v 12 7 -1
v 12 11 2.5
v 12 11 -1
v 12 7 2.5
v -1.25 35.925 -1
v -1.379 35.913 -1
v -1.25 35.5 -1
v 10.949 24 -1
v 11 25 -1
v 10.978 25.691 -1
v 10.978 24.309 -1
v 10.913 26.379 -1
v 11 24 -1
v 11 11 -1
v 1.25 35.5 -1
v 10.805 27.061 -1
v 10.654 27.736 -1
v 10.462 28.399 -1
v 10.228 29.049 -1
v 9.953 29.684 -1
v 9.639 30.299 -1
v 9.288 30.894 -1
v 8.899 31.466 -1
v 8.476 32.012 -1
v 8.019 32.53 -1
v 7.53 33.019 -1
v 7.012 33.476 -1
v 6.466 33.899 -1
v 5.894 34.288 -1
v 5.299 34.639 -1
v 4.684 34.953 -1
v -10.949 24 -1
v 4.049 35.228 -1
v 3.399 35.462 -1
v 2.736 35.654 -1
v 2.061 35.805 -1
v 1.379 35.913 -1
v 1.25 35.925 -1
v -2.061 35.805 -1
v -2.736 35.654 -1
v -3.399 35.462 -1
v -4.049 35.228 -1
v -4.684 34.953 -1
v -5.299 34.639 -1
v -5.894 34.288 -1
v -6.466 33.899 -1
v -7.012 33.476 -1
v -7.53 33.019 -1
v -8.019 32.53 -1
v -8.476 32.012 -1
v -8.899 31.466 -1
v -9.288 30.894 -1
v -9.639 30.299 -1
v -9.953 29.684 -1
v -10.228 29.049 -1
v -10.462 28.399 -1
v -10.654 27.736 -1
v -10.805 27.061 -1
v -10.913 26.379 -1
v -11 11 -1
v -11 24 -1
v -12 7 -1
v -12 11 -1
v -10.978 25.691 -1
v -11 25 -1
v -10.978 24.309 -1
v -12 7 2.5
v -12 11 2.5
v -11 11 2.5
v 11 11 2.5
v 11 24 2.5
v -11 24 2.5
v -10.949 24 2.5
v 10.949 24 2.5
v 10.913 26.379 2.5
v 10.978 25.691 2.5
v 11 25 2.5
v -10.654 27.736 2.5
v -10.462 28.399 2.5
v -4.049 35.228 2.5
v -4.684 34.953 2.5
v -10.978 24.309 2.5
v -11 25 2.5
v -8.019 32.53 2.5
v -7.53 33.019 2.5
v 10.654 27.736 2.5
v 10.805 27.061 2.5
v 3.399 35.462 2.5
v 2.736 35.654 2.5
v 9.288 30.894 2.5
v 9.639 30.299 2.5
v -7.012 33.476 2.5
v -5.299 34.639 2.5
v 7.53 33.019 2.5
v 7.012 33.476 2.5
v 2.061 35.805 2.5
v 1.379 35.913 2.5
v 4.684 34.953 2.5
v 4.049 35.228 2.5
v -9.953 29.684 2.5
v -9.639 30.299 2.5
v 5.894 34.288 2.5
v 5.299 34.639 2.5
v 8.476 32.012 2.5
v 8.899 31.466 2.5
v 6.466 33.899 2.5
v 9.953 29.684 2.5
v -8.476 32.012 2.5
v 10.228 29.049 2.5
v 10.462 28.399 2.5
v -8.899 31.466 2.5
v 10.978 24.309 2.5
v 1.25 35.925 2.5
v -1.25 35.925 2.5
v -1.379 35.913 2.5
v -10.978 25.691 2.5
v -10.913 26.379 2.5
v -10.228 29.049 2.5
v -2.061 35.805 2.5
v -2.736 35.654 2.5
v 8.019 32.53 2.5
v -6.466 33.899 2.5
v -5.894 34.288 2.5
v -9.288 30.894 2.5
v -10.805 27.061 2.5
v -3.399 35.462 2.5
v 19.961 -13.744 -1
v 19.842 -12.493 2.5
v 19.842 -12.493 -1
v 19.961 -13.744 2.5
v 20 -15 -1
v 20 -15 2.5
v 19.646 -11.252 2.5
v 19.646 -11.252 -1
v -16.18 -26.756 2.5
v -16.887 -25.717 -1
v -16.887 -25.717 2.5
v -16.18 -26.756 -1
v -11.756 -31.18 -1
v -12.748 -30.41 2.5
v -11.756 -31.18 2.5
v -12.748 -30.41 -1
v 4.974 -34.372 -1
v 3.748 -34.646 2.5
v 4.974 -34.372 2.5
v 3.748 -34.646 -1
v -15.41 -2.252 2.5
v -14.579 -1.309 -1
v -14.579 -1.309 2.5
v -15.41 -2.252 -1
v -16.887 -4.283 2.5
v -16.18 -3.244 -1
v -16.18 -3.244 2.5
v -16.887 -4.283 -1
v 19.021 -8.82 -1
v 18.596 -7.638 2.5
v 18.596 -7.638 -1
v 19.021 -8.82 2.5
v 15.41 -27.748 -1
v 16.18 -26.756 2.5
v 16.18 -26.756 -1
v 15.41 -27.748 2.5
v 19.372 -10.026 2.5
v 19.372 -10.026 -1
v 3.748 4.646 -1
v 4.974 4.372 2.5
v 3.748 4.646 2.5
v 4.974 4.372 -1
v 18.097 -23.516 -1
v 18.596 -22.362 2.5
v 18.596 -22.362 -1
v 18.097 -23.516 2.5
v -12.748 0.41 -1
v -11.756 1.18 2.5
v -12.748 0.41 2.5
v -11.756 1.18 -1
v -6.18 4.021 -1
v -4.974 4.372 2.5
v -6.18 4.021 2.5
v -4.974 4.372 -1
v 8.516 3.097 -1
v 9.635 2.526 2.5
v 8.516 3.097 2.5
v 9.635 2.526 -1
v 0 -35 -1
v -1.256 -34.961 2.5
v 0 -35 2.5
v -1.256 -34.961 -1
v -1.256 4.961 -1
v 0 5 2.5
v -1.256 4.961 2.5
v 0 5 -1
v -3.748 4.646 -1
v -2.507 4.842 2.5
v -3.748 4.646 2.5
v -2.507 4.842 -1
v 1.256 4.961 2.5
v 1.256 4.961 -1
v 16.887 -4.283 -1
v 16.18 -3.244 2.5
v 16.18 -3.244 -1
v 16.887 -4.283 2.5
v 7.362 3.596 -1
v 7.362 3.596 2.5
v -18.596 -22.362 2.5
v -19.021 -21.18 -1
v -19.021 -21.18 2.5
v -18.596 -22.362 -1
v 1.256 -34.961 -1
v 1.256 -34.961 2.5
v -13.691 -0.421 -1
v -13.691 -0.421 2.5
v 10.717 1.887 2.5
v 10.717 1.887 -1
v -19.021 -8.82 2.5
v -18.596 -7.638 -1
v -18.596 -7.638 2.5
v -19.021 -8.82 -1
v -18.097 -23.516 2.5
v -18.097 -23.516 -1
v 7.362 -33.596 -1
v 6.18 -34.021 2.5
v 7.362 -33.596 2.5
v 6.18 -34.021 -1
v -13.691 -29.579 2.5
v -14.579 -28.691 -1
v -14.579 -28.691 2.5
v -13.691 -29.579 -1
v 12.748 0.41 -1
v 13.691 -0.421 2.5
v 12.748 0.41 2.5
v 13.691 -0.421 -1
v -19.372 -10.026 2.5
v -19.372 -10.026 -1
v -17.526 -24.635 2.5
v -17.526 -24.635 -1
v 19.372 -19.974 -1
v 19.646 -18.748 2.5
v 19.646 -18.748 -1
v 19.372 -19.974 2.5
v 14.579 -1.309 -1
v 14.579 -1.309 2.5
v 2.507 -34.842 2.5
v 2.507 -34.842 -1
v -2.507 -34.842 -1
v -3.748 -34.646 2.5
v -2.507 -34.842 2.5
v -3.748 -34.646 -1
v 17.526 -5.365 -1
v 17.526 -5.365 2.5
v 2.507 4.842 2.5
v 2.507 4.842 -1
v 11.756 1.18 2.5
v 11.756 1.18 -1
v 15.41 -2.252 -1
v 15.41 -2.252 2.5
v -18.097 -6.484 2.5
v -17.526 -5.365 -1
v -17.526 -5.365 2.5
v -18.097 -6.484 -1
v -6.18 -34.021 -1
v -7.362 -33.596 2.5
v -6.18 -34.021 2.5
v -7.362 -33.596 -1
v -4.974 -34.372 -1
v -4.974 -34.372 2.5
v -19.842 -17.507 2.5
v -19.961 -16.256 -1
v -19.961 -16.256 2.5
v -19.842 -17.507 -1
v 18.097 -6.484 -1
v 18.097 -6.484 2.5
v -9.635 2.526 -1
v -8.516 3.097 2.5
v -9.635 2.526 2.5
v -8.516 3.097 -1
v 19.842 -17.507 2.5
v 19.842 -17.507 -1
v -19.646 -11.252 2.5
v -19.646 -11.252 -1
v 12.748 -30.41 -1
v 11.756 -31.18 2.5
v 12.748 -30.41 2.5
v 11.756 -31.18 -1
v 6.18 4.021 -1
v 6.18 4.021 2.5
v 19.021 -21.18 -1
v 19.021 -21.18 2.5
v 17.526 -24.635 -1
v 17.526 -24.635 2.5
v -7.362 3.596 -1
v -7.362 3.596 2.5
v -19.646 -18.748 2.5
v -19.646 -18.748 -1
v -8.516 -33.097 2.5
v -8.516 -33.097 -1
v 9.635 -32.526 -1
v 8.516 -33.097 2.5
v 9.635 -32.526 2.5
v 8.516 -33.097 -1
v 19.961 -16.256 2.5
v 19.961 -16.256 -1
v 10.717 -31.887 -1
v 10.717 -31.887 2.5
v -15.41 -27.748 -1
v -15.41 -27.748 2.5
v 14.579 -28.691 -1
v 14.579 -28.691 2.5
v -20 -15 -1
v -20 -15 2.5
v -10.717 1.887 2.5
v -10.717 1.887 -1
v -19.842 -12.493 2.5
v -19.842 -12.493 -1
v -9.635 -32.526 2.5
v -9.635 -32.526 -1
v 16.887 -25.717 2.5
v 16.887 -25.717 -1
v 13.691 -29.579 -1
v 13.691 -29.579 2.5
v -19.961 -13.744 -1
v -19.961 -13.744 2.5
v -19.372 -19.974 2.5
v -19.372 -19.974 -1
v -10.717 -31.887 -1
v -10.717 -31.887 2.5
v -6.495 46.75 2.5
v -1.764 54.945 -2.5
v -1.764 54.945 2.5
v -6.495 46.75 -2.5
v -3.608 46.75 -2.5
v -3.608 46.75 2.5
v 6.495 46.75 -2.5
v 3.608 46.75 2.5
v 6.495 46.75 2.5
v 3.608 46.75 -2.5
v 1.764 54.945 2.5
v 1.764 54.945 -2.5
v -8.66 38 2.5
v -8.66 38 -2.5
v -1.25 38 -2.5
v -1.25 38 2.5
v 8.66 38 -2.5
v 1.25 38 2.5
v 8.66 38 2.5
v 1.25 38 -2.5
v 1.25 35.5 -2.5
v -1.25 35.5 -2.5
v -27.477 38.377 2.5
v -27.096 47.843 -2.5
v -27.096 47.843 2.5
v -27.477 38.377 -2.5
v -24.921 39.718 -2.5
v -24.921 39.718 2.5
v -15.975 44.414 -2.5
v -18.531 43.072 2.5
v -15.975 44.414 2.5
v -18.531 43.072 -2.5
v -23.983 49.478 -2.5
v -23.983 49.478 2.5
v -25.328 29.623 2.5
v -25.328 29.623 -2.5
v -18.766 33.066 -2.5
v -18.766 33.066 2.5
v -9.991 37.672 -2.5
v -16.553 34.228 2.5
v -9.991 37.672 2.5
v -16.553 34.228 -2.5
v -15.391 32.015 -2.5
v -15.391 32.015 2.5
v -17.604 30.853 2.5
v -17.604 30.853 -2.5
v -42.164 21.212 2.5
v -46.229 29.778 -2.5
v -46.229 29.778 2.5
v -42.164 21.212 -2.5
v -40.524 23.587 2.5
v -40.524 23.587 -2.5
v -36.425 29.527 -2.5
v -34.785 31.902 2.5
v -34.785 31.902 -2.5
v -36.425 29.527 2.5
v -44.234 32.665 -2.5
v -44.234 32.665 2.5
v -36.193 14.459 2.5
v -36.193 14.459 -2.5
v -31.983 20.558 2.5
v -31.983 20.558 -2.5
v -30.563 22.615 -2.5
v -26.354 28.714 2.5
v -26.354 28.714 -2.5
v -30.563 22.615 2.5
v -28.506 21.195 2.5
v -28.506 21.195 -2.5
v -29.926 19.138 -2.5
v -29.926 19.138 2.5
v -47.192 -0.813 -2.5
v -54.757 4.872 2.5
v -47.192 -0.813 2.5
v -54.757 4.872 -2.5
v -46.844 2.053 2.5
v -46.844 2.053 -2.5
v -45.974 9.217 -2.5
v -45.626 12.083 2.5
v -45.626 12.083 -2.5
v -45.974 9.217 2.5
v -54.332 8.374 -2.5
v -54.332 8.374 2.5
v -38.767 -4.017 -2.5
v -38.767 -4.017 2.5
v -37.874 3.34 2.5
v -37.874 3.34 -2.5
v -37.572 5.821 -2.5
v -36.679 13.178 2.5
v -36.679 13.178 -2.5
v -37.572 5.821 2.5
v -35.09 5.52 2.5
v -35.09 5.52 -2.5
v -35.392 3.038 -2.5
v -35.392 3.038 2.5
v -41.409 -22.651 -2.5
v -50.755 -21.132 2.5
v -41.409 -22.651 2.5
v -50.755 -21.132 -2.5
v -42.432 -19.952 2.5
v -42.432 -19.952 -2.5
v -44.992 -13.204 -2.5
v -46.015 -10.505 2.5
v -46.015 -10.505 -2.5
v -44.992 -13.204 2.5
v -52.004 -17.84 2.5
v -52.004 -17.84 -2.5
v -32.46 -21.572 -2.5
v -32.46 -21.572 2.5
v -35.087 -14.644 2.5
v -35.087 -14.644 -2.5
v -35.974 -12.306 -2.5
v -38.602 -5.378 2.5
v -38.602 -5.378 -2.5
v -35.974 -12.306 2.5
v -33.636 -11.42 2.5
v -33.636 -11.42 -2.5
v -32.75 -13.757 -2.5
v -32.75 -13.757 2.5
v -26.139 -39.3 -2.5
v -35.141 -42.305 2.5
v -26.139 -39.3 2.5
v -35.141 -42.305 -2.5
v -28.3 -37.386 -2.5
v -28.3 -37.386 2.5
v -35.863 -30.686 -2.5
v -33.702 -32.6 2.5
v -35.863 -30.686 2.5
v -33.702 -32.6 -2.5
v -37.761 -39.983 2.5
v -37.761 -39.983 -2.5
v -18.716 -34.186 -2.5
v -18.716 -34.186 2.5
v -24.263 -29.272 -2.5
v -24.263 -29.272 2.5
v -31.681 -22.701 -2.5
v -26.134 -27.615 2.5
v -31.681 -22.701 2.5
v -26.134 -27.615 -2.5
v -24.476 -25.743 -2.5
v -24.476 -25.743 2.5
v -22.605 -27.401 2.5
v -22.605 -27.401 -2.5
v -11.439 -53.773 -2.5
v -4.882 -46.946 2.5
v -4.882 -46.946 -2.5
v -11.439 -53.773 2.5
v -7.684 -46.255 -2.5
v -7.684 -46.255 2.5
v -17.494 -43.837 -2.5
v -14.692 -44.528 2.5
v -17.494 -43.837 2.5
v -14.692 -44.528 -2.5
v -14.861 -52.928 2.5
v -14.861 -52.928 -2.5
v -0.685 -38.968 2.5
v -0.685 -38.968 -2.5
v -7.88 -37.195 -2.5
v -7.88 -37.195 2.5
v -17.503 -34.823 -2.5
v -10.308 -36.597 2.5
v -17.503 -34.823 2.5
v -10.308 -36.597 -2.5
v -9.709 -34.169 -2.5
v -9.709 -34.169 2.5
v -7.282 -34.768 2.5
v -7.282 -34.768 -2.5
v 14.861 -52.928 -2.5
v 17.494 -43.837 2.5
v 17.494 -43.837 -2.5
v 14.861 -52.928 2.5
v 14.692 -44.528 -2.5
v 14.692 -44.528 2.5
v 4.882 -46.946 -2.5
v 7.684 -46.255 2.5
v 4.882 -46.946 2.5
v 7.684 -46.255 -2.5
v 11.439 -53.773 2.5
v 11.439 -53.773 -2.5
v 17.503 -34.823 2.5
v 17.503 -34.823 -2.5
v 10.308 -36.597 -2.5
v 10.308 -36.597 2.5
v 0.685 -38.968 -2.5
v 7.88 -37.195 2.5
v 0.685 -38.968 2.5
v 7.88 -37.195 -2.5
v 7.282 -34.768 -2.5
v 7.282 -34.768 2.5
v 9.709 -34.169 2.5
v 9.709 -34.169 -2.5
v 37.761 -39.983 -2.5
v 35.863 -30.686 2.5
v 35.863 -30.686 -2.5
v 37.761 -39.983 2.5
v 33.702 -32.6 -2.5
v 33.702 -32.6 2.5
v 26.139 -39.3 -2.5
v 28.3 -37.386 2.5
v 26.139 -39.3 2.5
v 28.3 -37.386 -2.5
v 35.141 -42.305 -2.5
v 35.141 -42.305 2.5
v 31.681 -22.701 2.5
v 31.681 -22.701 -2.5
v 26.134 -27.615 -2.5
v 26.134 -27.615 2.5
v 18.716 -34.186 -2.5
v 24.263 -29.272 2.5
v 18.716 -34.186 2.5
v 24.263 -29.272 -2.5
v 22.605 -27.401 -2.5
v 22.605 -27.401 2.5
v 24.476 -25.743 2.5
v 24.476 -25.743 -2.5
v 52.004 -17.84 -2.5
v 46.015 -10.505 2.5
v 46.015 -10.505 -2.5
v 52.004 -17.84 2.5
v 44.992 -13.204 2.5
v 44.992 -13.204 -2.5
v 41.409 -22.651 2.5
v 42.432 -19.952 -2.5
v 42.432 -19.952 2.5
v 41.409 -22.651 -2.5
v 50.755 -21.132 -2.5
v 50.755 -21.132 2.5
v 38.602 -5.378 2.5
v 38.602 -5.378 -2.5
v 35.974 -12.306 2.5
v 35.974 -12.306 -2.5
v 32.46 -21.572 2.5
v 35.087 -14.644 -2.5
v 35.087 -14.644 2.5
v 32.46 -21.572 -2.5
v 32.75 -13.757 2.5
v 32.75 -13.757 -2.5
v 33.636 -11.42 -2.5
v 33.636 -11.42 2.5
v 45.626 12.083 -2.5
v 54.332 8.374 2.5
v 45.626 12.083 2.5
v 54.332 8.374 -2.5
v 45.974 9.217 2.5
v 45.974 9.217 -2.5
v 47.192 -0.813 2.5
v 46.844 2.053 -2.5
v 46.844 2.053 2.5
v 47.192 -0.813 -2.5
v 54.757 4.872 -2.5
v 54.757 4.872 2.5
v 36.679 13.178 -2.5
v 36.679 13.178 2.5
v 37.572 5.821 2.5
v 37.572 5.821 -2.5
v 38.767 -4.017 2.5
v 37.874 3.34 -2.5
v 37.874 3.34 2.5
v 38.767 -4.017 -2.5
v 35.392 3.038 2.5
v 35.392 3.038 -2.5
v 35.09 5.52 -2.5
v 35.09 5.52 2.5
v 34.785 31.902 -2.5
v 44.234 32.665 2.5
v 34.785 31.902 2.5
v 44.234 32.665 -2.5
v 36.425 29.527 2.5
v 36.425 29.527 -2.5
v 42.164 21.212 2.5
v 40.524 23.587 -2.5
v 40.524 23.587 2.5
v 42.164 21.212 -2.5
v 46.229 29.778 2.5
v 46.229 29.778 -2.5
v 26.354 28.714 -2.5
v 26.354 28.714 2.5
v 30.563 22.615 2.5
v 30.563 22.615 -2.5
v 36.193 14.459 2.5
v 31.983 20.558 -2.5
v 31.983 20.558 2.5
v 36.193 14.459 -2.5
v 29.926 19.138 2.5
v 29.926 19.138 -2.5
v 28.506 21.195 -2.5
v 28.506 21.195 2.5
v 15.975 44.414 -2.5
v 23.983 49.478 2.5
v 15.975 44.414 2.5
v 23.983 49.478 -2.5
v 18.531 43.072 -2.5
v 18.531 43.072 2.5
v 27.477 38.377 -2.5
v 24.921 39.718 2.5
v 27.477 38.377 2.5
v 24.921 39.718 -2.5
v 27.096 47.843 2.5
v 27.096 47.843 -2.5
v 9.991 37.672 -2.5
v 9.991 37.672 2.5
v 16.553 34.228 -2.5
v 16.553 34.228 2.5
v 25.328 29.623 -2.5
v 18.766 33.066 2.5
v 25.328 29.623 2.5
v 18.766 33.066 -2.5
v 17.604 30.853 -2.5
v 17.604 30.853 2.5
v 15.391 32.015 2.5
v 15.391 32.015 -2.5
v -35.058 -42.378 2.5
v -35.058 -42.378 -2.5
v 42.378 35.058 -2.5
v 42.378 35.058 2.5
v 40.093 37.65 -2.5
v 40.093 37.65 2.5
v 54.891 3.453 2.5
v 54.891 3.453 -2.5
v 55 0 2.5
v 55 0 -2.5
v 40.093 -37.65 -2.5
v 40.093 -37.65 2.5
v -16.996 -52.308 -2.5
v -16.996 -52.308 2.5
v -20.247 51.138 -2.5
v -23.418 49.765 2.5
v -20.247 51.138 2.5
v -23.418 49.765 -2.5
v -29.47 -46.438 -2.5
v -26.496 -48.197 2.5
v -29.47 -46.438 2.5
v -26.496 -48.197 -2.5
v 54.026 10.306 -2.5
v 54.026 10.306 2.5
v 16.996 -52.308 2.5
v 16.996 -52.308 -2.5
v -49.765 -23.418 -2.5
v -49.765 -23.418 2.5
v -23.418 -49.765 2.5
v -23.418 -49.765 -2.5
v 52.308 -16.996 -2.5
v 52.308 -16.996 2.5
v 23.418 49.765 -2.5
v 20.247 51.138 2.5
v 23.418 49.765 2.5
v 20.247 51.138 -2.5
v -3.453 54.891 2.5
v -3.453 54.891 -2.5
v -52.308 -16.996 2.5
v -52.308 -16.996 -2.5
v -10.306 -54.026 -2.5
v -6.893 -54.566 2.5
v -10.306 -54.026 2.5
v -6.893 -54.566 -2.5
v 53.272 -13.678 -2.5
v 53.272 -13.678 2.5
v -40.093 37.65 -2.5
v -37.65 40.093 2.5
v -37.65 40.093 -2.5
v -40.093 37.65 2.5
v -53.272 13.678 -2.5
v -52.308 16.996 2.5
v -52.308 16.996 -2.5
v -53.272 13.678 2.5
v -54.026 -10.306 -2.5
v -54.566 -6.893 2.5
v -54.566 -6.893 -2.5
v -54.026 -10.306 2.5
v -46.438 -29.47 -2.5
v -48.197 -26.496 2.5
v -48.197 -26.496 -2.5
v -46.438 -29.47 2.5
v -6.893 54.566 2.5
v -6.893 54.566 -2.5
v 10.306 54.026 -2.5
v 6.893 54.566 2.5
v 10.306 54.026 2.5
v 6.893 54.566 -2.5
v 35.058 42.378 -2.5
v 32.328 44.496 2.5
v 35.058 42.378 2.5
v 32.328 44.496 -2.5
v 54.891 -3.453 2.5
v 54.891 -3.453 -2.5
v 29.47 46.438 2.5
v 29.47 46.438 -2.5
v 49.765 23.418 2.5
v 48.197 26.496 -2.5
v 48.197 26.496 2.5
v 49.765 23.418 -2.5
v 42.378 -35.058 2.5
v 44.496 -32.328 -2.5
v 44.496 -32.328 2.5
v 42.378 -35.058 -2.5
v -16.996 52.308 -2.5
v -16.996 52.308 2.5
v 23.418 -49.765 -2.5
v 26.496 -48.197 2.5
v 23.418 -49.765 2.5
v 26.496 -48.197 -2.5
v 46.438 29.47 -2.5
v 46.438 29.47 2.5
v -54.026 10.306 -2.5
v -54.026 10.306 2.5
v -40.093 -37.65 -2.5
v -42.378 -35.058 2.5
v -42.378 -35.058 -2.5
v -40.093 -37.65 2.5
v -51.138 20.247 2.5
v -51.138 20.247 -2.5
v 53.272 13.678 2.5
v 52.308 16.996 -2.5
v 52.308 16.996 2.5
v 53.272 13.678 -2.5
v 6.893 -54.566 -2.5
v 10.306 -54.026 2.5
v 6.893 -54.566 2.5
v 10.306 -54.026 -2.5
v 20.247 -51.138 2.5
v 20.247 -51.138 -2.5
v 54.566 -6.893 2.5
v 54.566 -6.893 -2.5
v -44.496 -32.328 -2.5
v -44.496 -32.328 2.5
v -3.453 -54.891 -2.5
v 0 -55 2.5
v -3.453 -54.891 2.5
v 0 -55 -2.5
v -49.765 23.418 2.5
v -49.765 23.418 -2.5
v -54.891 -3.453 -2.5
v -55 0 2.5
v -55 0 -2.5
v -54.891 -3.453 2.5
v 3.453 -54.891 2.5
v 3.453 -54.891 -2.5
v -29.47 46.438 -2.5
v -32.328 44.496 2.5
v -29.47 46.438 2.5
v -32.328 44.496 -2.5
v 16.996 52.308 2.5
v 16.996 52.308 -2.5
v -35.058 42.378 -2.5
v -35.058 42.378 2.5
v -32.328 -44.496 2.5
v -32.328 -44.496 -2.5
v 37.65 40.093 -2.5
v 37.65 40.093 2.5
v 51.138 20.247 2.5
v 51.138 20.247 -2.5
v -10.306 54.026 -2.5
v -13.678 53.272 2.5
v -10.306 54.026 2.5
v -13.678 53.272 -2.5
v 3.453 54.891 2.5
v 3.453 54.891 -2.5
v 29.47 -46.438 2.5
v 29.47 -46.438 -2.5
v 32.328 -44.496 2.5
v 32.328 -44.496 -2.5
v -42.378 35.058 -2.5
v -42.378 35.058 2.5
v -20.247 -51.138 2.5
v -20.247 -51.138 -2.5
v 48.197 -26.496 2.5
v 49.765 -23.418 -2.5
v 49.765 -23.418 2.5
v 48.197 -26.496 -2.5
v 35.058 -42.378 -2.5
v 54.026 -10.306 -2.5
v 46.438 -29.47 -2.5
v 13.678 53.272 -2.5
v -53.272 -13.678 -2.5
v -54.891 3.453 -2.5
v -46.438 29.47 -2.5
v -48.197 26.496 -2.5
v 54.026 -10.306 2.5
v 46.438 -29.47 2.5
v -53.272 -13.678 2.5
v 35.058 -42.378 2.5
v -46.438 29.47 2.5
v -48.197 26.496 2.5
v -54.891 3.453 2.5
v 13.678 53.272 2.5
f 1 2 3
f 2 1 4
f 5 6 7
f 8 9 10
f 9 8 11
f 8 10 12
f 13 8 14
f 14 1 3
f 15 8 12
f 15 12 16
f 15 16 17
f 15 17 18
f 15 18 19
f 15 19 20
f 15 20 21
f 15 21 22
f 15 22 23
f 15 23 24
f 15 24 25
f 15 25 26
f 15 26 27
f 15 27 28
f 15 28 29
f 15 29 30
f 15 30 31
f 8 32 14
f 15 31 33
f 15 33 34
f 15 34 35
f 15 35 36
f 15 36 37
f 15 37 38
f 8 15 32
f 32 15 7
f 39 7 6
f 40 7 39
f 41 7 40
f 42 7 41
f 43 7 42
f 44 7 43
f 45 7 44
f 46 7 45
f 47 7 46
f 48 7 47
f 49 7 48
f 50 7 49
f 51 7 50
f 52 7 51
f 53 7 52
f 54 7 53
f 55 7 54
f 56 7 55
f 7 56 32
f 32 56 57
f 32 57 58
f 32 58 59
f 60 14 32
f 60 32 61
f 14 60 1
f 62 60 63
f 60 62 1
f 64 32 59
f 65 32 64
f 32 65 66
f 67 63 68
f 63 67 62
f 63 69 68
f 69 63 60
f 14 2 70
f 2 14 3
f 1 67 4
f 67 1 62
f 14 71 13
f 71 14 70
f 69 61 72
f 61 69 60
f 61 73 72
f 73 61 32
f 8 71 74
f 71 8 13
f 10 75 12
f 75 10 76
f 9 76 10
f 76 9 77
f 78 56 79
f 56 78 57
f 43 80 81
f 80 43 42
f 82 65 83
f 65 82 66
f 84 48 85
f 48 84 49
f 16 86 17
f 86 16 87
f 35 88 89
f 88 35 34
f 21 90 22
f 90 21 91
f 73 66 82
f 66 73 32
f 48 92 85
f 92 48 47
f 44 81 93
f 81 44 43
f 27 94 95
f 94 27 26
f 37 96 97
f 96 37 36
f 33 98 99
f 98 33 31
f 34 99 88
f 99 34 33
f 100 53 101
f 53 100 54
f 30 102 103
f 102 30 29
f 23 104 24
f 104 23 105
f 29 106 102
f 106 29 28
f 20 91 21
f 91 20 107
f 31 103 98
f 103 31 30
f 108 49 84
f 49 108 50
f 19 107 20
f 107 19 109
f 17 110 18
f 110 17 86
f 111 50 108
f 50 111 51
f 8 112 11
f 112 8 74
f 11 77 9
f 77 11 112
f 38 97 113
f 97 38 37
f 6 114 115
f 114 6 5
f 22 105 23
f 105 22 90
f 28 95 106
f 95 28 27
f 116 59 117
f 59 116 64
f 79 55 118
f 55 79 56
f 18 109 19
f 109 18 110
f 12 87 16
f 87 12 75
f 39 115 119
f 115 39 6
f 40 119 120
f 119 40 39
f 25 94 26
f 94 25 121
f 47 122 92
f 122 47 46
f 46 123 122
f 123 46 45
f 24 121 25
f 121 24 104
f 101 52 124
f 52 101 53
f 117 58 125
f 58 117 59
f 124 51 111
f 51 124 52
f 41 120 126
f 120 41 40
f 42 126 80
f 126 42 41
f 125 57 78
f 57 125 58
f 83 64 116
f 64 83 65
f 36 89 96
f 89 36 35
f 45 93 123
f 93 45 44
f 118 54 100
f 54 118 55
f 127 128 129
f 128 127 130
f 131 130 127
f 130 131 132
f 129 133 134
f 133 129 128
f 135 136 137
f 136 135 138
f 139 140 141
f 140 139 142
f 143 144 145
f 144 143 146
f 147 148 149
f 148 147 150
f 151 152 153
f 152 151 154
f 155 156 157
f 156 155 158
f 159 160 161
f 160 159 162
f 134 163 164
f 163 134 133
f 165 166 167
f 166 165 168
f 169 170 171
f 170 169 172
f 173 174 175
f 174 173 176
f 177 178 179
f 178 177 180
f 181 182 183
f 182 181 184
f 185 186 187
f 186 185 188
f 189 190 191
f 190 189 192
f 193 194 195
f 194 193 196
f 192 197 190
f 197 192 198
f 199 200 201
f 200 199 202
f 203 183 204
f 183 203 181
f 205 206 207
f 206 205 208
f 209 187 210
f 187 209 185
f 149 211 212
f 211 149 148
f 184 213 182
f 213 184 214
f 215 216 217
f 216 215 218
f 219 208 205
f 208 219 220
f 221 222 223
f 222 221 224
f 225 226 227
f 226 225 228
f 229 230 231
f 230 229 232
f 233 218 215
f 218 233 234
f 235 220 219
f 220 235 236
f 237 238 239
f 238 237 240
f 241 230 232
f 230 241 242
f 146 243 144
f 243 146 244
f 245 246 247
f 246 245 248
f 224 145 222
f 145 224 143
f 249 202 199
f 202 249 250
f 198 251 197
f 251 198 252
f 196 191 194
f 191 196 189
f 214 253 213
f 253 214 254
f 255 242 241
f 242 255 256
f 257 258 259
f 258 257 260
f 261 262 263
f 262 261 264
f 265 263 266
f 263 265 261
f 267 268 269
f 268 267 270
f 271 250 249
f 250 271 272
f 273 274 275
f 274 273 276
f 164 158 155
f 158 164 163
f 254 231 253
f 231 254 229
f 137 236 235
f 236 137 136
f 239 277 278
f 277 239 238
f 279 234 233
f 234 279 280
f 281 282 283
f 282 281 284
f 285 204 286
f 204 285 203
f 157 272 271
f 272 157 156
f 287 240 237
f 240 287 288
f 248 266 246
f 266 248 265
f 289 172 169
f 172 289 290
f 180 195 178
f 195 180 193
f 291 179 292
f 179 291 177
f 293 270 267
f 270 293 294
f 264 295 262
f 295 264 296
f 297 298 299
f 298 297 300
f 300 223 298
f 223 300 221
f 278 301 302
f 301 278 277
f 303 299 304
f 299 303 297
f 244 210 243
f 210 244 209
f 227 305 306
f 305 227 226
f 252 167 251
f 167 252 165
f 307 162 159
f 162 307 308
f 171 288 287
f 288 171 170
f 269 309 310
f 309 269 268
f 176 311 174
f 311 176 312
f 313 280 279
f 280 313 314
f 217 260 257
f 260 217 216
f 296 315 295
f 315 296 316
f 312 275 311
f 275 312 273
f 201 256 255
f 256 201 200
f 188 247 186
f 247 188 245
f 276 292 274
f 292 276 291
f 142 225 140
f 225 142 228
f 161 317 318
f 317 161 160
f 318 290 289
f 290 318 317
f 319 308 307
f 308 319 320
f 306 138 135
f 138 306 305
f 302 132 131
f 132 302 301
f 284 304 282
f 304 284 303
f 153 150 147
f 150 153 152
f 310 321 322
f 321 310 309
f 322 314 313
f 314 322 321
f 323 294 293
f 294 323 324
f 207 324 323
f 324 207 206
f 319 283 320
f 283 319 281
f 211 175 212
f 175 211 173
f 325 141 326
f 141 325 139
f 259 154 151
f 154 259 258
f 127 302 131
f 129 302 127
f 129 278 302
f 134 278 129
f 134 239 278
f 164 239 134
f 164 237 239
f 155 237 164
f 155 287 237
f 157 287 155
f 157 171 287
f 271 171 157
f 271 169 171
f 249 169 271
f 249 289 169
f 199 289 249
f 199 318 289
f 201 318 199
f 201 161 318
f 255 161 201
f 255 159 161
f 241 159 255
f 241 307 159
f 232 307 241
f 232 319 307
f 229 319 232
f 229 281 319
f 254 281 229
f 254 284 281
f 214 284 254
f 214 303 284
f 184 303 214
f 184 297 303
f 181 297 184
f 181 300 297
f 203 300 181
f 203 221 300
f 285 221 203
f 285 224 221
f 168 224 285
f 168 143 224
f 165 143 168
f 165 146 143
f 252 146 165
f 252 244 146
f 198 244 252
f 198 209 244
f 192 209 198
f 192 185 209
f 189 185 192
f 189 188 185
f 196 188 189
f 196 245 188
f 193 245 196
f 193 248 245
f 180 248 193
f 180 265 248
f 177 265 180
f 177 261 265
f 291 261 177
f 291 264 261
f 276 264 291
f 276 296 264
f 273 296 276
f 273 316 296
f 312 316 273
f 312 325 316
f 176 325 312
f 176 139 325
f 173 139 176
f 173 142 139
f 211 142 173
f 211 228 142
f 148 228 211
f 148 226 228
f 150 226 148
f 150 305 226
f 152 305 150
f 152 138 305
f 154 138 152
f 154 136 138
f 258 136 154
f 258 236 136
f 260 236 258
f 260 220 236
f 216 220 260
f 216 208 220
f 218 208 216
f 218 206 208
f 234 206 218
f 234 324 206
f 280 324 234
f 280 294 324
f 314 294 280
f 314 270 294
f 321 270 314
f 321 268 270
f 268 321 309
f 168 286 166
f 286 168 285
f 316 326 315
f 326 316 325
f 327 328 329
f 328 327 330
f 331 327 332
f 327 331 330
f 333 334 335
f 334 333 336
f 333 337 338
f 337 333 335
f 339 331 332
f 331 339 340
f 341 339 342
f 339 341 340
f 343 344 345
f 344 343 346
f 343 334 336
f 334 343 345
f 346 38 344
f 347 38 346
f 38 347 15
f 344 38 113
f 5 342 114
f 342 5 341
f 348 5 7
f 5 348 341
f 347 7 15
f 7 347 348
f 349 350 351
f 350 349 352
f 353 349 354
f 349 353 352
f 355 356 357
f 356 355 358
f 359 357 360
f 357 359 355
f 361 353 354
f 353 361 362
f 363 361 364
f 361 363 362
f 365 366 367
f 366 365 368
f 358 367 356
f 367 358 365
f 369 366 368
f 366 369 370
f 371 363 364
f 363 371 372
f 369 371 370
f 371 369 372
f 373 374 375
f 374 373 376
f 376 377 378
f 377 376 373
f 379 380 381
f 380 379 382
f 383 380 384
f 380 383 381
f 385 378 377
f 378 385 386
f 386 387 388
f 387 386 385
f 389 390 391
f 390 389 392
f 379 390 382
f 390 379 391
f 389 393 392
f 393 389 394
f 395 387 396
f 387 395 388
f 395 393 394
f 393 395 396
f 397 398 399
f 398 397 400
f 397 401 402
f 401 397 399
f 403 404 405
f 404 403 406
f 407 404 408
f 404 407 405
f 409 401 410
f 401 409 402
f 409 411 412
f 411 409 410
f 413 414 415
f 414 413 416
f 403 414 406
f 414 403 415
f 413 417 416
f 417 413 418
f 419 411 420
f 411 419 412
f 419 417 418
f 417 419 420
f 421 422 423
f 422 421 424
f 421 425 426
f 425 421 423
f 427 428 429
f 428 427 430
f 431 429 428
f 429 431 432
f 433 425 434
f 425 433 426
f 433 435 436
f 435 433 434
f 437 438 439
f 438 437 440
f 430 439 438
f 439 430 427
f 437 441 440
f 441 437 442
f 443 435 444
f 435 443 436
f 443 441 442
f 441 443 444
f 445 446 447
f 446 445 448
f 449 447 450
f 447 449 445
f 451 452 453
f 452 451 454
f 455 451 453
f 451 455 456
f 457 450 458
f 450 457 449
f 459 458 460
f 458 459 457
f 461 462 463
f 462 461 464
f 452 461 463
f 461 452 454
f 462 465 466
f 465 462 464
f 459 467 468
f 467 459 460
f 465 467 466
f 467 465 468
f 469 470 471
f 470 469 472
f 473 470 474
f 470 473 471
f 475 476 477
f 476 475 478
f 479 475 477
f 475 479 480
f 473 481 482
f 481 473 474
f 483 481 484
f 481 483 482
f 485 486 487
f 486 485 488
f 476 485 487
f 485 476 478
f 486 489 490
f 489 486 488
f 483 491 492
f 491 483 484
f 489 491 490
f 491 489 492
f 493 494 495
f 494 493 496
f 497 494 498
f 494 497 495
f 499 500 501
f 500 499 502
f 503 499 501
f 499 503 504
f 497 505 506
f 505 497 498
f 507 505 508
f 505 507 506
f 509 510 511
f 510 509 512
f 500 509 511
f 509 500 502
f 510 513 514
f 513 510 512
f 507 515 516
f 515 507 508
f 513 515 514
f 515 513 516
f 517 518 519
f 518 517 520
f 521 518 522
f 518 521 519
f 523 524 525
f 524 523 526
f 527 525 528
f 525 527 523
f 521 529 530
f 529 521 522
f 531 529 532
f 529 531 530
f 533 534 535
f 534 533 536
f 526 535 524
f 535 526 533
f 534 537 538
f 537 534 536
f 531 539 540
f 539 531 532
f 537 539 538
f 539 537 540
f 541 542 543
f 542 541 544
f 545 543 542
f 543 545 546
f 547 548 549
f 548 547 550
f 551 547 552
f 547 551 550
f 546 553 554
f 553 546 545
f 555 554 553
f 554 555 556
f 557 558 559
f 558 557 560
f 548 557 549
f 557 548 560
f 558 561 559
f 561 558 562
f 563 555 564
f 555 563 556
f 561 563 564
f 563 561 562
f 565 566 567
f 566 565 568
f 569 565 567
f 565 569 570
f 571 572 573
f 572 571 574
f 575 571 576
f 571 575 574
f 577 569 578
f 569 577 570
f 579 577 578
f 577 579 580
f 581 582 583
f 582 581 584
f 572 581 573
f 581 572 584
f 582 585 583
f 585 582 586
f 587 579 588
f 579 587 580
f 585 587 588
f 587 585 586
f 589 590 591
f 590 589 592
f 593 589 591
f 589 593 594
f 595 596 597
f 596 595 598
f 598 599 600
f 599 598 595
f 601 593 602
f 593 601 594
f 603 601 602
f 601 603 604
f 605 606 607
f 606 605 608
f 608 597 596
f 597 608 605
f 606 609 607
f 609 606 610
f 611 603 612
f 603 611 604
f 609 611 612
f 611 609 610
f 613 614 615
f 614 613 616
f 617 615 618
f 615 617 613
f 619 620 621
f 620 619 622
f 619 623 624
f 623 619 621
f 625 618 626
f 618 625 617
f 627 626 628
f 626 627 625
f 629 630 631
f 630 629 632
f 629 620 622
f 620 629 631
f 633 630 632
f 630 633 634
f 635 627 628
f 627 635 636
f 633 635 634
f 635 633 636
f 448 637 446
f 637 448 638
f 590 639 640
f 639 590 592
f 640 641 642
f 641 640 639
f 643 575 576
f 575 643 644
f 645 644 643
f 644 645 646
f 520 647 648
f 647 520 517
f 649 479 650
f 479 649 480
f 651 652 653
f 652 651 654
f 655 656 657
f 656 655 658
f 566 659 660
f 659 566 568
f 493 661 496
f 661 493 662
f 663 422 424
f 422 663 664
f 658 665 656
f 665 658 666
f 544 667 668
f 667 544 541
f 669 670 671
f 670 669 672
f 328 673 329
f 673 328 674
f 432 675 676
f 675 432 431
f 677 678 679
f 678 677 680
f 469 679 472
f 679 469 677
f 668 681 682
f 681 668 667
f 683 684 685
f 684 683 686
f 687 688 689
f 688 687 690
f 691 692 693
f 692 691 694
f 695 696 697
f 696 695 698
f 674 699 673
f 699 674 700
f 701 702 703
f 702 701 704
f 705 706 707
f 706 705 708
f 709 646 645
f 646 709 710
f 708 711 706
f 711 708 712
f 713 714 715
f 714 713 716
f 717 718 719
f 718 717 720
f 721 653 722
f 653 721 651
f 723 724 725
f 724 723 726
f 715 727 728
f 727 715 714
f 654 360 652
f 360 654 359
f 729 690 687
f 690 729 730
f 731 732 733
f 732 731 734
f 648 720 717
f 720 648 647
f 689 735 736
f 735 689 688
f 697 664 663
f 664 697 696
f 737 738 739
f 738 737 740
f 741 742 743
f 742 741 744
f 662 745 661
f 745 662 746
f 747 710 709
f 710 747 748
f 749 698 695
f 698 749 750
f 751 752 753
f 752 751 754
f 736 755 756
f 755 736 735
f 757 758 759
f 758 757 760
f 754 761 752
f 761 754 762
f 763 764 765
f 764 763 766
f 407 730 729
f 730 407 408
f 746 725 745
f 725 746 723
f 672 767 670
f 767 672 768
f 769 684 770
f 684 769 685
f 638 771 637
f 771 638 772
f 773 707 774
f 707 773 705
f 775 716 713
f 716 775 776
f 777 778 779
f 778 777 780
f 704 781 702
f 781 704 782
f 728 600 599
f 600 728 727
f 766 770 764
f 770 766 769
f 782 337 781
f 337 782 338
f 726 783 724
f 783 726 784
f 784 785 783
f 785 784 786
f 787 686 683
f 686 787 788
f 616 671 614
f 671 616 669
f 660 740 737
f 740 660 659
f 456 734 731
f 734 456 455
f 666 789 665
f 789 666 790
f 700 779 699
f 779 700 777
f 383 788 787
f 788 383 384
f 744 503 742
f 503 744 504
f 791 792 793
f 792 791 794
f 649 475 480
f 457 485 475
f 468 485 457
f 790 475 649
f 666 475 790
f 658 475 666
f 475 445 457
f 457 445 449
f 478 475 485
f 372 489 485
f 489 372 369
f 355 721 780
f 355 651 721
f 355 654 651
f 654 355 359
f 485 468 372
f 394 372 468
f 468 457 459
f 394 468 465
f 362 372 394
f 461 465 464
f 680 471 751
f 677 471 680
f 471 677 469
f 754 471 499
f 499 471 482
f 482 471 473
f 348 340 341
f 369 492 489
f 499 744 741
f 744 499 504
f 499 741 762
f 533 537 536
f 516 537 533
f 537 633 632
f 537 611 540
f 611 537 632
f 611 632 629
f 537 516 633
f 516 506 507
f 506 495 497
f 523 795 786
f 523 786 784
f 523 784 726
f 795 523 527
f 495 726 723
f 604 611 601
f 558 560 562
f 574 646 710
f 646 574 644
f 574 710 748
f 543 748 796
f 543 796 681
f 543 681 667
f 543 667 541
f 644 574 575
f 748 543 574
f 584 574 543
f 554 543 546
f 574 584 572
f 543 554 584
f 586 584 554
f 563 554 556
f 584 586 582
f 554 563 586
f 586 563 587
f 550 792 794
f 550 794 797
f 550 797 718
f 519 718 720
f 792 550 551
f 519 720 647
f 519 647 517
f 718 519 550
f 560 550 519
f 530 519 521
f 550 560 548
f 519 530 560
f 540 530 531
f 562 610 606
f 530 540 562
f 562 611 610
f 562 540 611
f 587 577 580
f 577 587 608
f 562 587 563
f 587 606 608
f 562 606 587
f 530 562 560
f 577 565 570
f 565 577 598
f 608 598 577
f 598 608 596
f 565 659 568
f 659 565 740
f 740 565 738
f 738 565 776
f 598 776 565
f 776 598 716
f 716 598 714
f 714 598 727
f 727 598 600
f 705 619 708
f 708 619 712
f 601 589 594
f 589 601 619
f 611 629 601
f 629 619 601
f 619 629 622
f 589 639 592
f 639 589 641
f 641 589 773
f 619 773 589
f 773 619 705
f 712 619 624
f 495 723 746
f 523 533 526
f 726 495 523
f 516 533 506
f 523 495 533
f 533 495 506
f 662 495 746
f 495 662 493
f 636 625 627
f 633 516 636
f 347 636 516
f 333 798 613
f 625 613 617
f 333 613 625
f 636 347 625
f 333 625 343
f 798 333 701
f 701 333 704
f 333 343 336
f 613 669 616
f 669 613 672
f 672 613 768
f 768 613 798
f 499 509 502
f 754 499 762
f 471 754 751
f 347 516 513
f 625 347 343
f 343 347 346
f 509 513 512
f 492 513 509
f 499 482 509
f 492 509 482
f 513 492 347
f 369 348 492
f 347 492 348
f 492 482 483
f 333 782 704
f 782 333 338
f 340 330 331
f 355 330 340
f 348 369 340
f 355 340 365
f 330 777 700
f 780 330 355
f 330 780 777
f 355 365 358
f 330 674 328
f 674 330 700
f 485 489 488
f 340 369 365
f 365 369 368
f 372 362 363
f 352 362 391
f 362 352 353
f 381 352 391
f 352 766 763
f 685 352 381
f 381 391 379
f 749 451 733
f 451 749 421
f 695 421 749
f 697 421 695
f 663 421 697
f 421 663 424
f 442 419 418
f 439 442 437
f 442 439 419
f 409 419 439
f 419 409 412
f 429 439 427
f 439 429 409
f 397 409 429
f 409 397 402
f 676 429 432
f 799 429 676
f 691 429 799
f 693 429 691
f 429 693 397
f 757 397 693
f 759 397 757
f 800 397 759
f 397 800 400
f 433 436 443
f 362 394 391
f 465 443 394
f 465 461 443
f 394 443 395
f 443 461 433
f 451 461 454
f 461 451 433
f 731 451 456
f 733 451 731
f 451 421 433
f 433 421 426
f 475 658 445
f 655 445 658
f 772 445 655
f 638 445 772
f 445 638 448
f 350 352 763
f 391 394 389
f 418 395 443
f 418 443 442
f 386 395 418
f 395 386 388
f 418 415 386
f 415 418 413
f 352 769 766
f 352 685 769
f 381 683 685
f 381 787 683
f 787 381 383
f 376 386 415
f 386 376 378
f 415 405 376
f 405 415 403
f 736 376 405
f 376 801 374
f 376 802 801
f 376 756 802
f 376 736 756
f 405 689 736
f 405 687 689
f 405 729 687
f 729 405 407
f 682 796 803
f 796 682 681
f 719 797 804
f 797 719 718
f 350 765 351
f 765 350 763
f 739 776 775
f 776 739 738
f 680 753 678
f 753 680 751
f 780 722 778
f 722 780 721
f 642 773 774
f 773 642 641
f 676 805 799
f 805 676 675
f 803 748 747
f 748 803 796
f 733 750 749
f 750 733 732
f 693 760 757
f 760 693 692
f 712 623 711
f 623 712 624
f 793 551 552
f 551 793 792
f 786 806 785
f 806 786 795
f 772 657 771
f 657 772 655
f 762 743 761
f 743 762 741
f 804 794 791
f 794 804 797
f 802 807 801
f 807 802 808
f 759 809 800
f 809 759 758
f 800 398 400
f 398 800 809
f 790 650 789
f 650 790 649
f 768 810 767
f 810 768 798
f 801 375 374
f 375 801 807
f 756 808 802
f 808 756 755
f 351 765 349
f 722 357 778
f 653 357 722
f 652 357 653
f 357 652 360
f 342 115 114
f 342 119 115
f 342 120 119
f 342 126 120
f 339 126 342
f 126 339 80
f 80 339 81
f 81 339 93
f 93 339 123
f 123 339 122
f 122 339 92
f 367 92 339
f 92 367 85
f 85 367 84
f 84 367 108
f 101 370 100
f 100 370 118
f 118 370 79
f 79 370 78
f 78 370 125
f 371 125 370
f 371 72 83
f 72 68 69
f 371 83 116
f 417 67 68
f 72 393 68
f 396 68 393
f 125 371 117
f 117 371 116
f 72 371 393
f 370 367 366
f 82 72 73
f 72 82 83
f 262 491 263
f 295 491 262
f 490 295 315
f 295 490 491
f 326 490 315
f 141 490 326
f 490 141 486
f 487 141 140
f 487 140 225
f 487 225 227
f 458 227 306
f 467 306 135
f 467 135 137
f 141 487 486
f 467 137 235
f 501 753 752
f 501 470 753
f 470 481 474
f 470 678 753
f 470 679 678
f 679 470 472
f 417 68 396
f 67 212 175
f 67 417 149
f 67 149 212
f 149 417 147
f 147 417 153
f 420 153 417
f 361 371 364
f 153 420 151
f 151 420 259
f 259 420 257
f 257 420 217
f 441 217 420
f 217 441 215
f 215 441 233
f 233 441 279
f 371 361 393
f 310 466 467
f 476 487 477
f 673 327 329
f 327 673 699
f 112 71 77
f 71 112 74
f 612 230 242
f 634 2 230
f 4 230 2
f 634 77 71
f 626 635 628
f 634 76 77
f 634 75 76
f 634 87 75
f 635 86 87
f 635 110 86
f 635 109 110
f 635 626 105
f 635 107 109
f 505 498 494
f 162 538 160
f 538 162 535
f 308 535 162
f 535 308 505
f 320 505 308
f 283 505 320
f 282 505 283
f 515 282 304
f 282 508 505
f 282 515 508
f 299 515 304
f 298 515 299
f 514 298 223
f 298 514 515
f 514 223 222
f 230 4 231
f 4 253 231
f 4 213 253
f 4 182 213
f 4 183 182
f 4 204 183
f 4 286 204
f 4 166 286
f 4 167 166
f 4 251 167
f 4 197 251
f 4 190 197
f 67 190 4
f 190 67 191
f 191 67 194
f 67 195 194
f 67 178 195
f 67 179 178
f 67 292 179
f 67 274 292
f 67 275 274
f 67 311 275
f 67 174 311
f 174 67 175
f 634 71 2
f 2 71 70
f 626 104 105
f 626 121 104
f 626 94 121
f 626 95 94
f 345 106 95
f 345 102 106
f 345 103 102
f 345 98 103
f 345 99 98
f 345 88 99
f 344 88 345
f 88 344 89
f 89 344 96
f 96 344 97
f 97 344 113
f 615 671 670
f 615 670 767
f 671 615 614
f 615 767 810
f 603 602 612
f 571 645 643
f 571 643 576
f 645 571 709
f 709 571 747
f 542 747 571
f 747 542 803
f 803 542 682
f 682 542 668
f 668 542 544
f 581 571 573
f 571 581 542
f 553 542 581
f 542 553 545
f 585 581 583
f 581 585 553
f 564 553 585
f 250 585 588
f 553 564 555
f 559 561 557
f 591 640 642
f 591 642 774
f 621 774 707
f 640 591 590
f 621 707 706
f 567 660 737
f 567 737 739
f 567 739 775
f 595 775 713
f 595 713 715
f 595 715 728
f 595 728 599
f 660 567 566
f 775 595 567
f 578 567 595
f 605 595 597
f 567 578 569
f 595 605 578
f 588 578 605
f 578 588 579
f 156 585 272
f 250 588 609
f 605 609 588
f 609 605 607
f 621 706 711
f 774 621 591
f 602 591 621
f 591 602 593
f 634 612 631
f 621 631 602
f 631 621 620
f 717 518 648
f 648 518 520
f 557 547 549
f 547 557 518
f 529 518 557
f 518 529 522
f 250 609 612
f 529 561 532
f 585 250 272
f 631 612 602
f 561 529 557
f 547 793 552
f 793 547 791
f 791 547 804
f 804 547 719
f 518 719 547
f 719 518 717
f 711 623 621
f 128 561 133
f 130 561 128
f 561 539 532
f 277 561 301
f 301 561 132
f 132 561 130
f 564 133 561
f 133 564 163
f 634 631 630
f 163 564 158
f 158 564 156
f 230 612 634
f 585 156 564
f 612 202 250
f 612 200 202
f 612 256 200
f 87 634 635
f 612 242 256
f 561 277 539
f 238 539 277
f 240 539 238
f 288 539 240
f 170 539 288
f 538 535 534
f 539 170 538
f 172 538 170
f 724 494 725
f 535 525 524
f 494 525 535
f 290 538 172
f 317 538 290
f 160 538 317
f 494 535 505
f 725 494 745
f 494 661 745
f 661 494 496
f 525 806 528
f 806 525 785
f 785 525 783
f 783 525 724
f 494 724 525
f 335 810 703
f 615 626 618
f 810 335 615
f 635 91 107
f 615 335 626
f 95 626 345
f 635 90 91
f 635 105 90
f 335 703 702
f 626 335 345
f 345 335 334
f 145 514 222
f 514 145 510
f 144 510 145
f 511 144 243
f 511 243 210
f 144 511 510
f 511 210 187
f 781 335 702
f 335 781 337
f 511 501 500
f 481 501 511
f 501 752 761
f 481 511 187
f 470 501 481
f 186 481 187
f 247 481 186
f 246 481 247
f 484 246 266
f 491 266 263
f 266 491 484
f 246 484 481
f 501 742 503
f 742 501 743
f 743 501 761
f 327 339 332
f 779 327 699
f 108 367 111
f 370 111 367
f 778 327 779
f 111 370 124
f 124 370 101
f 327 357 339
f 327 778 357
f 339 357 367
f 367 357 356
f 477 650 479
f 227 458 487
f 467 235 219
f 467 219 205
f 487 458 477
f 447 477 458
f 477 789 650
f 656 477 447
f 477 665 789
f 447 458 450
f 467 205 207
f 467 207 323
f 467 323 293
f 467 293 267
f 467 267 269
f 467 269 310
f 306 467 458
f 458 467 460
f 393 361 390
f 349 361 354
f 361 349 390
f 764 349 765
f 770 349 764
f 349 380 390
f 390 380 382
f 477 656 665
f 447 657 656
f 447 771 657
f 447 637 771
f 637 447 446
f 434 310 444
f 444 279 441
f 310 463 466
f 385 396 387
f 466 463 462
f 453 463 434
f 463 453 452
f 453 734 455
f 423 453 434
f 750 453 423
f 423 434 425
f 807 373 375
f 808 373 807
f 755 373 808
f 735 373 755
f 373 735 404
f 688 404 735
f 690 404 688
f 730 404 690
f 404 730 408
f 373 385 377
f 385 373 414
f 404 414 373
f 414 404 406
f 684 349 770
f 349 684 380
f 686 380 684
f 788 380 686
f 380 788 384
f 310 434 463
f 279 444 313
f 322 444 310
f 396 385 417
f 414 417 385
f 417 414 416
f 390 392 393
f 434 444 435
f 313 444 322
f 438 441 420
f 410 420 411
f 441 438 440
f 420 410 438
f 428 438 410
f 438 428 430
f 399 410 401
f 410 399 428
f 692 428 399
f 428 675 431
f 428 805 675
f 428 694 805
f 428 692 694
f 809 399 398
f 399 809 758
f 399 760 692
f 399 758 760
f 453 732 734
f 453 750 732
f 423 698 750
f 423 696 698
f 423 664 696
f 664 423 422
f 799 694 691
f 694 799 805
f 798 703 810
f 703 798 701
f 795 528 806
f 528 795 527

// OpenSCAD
// file: ../../../../shapes/religion/christianity/crucifixion-cross/crucifixion-cross.scad
crucifixionCcross();

module crucifixionCcross(height=2)
{
    beamWidth = 3;
    
    union()
    {
        // vertical beam
        xTranslate = -beamWidth / 2.0;
        yLength = 13;
        color("brown")
        translate([xTranslate, 0, 0])
        cube([3, yLength, height]);

        // horizontal beam        
        yTranslate = yLength * 0.5;
        xLength = yLength * 0.75;
        xTranslateHBeam = -xLength / 2.0;
        
        color("green")
        translate([xTranslateHBeam, yTranslate, 0])
        cube([xLength, 3, height]);        
    }        
}
// file: ../../../../shapes/trees/christmas/christmas-tree.scad
christmasTree();

module christmasTree(height = 3)
{
    union()
    {
        // top triangle
        translate([0, 30, 0])
        triangle(10, height);
        
        // middle triangle
        translate([0, 15, 0])
        color("green")
        triangle(15, height);
        
        // bottom triangle
        triangle(20, height);
        
        // trunk
        color("brown")
        translate([-2.5, -15, 0])
        cube([5, 5, height]);
    }
}

module triangle(size, height)
{
    rotate([0, 0, 90])
    cylinder(r=size, 
             $fn=3,
             h=height);
}
// file: ../../../../shapes/throwie-cutout/throwie-cutout.scad
throwieCutout();

/**
 * this modeled after a 5mm LED
 */
module throwieCutout(height=2)
{
    ledWidth = 10;
    ledHeight = 13;
    
    union()
    {
        // LED bottom cutout
        ledBottomCutoutLengthX = ledWidth + 1 + 1; 
        xTranslate = -ledBottomCutoutLengthX / 2.0;
        yLength = 13;
        color("brown")
        translate([xTranslate, 0, 0])
        cube([ledBottomCutoutLengthX, 2, height]);

        // LED middle coutout        
        yTranslate = 1.5;
        xLength = ledWidth + 1;
        xTranslateHBeam = -xLength / 2.0; 
        color("green")
        translate([xTranslateHBeam, yTranslate, 0])
        cube([xLength, 7, height]);
        
        // LED curved top
        curvedTopTranslateY = (2 + 7);
        curvedTopRadius = (ledWidth / 2.0) + 0.5;
        color("red")
        translate([0, curvedTopTranslateY, 0])
        cylinder (h = height, r=curvedTopRadius, $fn=100);
        
        // battery
        batteryRadius = 10;
        translate([0, -11, 0])
        cylinder (h = height, r=batteryRadius, $fn=100);
    }        
}
// file: ../../../../shapes/spurs/spurs-a.scad
// Module names are of the form poly_<inkscape-path-id>().  As a result,
// you can associate a polygon in this OpenSCAD program with the corresponding
// SVG element in the Inkscape document by looking for the XML element with
// the attribute id="inkscape-path-id".

// fudge value is used to ensure that subtracted solids are a tad taller
// in the z dimension than the polygon being subtracted from.  This helps
// keep the resulting .stl file manifold.
fudge = 0.1;

module spurs(h)
{
  scale([25.4/90, -25.4/90, 1]) union()
  {
    linear_extrude(height=h)
      polygon([[13.500000,-56.000000],[29.500000,-55.000000],[54.500000,-55.000000],[58.503750,-55.048750],[60.522969,-55.341719],[62.290000,-56.020000],[64.325156,-57.853594],[66.241250,-60.541250],[69.240000,-66.000000],[80.500000,-87.000000],[106.280000,-135.000000],[118.870000,-159.000000],[122.780000,-198.000000],[124.023594,-204.882813],[125.843750,-209.652500],[128.457031,-214.095937],[132.080000,-220.000000],[148.490000,-248.000000],[153.376719,-256.487656],[155.041895,-259.143652],[156.518750,-260.956250],[158.055137,-262.086816],[159.898906,-262.696719],[165.500000,-263.000000],[214.500000,-263.000000],[214.500000,-213.000000],[213.360000,-196.000000],[213.360000,-154.000000],[213.495000,-150.462500],[213.360000,-147.000000],[196.920000,-117.000000],[156.350000,-45.000000],[125.920000,9.000000],[120.671250,18.592500],[117.385469,23.577187],[115.794199,25.366055],[114.320000,26.400000],[112.797344,26.797500],[110.981250,26.970000],[107.500000,27.000000],[79.500000,27.000000],[65.500000,28.000000],[31.500000,28.000000],[27.943750,28.030000],[24.500000,28.600000],[22.684180,29.597539],[20.548438,31.277812],[15.792500,35.922500],[7.670000,45.000000],[-36.500000,94.040000],[-25.500000,94.040000],[-15.500000,95.000000],[1.500000,95.000000],[22.500000,96.000000],[2.500000,114.080000],[-38.500000,149.000000],[-23.230000,165.000000],[-3.230000,188.000000],[14.500000,210.000000],[-66.500000,189.000000],[-91.500000,263.000000],[-92.970664,261.624141],[-94.426562,259.592500],[-97.197500,254.302500],[-101.500000,244.000000],[-121.500000,198.000000],[-200.500000,222.000000],[-174.840000,182.000000],[-154.500000,151.000000],[-187.500000,128.020000],[-214.500000,108.000000],[-166.500000,103.830000],[-135.500000,101.000000],[-137.410000,77.000000],[-139.590000,41.000000],[-140.500000,31.000000],[-138.108496,32.343340],[-135.722969,34.055469],[-131.038750,38.223750],[-122.500000,47.000000],[-111.500000,57.040000],[-94.500000,74.000000],[-77.500000,27.000000],[-107.500000,26.000000],[-117.196250,25.451250],[-122.812656,24.814531],[-126.090000,23.980000],[-127.513906,22.488438],[-128.773750,20.335000],[-130.730000,16.000000],[-138.200000,-1.000000],[-140.195000,-5.868750],[-140.649688,-8.406719],[-140.330000,-11.000000],[-134.780000,-21.000000],[-120.780000,-45.000000],[-74.650000,-124.000000],[-55.110000,-158.000000],[-46.570000,-206.000000],[-30.280000,-238.000000],[-21.920000,-254.000000],[-19.818750,-257.793750],[-18.535156,-259.646094],[-17.110000,-260.980000],[-15.251406,-261.684844],[-12.943750,-261.983750],[-8.500000,-261.990000],[5.500000,-261.000000],[19.500000,-261.000000],[31.500000,-260.040000],[43.500000,-260.040000],[43.500000,-217.000000],[44.500000,-200.000000],[44.500000,-162.000000],[43.800000,-154.000000],[28.100000,-127.000000],[-14.500000,-56.000000],[13.500000,-56.000000]]);
  }
}

spurs(5);
// file: ../../../coin.scad
use <../shapes/spurs/spurs-a.scad>
use <../shapes/throwie-cutout/throwie-cutout.scad>
use <../shapes/trees/christmas/christmas-tree.scad>
use <../shapes/religion/christianity/crucifixion-cross/crucifixion-cross.scad>

module coin(innerIcon,
            innerIconXyScale,
            innerIconOffsetY,
            outerIcon,
            outerIconCount,            
            outerIconXyScale,
            radius,
            height)
{
    difference()
    {
        // main disk
        cylinder (h = height, r=radius, center = true, $fn=100);
        
        // inner icon
        translate([0, innerIconOffsetY, -1])
        scale([innerIconXyScale, innerIconXyScale, 6.5])
        coinIcon(innerIcon, height);
        
        // outer icons
        for ( i = [0 : outerIconCount] )
        {
            rotate( i * 360 / (outerIconCount+1), [0, 0, 1])
            translate([0, 43, -5])
            scale([outerIconXyScale, outerIconXyScale, 3.0])
            coinIcon(outerIcon, height);
        }
    }    
}

module coinIcon(iconName, height)
{
    if(iconName == "Cross")
    {
        crucifixionCcross(height);
    }
    else if(iconName == "Throwie")
    {
        throwieCutout(height=height);
    }
    else
    {
        // defalut
        christmasTree(height);
    }    
}
// main file
use <../../../coin.scad>;

coin(innerIcon = "Throwie",
     innerIconXyScale = 2,
     innerIconOffsetY = 7,
     outerIcon = "Tree",
     outerIconCount = 12,            
     outerIconXyScale = 0.5,
     radius = 55,
     height=5);
